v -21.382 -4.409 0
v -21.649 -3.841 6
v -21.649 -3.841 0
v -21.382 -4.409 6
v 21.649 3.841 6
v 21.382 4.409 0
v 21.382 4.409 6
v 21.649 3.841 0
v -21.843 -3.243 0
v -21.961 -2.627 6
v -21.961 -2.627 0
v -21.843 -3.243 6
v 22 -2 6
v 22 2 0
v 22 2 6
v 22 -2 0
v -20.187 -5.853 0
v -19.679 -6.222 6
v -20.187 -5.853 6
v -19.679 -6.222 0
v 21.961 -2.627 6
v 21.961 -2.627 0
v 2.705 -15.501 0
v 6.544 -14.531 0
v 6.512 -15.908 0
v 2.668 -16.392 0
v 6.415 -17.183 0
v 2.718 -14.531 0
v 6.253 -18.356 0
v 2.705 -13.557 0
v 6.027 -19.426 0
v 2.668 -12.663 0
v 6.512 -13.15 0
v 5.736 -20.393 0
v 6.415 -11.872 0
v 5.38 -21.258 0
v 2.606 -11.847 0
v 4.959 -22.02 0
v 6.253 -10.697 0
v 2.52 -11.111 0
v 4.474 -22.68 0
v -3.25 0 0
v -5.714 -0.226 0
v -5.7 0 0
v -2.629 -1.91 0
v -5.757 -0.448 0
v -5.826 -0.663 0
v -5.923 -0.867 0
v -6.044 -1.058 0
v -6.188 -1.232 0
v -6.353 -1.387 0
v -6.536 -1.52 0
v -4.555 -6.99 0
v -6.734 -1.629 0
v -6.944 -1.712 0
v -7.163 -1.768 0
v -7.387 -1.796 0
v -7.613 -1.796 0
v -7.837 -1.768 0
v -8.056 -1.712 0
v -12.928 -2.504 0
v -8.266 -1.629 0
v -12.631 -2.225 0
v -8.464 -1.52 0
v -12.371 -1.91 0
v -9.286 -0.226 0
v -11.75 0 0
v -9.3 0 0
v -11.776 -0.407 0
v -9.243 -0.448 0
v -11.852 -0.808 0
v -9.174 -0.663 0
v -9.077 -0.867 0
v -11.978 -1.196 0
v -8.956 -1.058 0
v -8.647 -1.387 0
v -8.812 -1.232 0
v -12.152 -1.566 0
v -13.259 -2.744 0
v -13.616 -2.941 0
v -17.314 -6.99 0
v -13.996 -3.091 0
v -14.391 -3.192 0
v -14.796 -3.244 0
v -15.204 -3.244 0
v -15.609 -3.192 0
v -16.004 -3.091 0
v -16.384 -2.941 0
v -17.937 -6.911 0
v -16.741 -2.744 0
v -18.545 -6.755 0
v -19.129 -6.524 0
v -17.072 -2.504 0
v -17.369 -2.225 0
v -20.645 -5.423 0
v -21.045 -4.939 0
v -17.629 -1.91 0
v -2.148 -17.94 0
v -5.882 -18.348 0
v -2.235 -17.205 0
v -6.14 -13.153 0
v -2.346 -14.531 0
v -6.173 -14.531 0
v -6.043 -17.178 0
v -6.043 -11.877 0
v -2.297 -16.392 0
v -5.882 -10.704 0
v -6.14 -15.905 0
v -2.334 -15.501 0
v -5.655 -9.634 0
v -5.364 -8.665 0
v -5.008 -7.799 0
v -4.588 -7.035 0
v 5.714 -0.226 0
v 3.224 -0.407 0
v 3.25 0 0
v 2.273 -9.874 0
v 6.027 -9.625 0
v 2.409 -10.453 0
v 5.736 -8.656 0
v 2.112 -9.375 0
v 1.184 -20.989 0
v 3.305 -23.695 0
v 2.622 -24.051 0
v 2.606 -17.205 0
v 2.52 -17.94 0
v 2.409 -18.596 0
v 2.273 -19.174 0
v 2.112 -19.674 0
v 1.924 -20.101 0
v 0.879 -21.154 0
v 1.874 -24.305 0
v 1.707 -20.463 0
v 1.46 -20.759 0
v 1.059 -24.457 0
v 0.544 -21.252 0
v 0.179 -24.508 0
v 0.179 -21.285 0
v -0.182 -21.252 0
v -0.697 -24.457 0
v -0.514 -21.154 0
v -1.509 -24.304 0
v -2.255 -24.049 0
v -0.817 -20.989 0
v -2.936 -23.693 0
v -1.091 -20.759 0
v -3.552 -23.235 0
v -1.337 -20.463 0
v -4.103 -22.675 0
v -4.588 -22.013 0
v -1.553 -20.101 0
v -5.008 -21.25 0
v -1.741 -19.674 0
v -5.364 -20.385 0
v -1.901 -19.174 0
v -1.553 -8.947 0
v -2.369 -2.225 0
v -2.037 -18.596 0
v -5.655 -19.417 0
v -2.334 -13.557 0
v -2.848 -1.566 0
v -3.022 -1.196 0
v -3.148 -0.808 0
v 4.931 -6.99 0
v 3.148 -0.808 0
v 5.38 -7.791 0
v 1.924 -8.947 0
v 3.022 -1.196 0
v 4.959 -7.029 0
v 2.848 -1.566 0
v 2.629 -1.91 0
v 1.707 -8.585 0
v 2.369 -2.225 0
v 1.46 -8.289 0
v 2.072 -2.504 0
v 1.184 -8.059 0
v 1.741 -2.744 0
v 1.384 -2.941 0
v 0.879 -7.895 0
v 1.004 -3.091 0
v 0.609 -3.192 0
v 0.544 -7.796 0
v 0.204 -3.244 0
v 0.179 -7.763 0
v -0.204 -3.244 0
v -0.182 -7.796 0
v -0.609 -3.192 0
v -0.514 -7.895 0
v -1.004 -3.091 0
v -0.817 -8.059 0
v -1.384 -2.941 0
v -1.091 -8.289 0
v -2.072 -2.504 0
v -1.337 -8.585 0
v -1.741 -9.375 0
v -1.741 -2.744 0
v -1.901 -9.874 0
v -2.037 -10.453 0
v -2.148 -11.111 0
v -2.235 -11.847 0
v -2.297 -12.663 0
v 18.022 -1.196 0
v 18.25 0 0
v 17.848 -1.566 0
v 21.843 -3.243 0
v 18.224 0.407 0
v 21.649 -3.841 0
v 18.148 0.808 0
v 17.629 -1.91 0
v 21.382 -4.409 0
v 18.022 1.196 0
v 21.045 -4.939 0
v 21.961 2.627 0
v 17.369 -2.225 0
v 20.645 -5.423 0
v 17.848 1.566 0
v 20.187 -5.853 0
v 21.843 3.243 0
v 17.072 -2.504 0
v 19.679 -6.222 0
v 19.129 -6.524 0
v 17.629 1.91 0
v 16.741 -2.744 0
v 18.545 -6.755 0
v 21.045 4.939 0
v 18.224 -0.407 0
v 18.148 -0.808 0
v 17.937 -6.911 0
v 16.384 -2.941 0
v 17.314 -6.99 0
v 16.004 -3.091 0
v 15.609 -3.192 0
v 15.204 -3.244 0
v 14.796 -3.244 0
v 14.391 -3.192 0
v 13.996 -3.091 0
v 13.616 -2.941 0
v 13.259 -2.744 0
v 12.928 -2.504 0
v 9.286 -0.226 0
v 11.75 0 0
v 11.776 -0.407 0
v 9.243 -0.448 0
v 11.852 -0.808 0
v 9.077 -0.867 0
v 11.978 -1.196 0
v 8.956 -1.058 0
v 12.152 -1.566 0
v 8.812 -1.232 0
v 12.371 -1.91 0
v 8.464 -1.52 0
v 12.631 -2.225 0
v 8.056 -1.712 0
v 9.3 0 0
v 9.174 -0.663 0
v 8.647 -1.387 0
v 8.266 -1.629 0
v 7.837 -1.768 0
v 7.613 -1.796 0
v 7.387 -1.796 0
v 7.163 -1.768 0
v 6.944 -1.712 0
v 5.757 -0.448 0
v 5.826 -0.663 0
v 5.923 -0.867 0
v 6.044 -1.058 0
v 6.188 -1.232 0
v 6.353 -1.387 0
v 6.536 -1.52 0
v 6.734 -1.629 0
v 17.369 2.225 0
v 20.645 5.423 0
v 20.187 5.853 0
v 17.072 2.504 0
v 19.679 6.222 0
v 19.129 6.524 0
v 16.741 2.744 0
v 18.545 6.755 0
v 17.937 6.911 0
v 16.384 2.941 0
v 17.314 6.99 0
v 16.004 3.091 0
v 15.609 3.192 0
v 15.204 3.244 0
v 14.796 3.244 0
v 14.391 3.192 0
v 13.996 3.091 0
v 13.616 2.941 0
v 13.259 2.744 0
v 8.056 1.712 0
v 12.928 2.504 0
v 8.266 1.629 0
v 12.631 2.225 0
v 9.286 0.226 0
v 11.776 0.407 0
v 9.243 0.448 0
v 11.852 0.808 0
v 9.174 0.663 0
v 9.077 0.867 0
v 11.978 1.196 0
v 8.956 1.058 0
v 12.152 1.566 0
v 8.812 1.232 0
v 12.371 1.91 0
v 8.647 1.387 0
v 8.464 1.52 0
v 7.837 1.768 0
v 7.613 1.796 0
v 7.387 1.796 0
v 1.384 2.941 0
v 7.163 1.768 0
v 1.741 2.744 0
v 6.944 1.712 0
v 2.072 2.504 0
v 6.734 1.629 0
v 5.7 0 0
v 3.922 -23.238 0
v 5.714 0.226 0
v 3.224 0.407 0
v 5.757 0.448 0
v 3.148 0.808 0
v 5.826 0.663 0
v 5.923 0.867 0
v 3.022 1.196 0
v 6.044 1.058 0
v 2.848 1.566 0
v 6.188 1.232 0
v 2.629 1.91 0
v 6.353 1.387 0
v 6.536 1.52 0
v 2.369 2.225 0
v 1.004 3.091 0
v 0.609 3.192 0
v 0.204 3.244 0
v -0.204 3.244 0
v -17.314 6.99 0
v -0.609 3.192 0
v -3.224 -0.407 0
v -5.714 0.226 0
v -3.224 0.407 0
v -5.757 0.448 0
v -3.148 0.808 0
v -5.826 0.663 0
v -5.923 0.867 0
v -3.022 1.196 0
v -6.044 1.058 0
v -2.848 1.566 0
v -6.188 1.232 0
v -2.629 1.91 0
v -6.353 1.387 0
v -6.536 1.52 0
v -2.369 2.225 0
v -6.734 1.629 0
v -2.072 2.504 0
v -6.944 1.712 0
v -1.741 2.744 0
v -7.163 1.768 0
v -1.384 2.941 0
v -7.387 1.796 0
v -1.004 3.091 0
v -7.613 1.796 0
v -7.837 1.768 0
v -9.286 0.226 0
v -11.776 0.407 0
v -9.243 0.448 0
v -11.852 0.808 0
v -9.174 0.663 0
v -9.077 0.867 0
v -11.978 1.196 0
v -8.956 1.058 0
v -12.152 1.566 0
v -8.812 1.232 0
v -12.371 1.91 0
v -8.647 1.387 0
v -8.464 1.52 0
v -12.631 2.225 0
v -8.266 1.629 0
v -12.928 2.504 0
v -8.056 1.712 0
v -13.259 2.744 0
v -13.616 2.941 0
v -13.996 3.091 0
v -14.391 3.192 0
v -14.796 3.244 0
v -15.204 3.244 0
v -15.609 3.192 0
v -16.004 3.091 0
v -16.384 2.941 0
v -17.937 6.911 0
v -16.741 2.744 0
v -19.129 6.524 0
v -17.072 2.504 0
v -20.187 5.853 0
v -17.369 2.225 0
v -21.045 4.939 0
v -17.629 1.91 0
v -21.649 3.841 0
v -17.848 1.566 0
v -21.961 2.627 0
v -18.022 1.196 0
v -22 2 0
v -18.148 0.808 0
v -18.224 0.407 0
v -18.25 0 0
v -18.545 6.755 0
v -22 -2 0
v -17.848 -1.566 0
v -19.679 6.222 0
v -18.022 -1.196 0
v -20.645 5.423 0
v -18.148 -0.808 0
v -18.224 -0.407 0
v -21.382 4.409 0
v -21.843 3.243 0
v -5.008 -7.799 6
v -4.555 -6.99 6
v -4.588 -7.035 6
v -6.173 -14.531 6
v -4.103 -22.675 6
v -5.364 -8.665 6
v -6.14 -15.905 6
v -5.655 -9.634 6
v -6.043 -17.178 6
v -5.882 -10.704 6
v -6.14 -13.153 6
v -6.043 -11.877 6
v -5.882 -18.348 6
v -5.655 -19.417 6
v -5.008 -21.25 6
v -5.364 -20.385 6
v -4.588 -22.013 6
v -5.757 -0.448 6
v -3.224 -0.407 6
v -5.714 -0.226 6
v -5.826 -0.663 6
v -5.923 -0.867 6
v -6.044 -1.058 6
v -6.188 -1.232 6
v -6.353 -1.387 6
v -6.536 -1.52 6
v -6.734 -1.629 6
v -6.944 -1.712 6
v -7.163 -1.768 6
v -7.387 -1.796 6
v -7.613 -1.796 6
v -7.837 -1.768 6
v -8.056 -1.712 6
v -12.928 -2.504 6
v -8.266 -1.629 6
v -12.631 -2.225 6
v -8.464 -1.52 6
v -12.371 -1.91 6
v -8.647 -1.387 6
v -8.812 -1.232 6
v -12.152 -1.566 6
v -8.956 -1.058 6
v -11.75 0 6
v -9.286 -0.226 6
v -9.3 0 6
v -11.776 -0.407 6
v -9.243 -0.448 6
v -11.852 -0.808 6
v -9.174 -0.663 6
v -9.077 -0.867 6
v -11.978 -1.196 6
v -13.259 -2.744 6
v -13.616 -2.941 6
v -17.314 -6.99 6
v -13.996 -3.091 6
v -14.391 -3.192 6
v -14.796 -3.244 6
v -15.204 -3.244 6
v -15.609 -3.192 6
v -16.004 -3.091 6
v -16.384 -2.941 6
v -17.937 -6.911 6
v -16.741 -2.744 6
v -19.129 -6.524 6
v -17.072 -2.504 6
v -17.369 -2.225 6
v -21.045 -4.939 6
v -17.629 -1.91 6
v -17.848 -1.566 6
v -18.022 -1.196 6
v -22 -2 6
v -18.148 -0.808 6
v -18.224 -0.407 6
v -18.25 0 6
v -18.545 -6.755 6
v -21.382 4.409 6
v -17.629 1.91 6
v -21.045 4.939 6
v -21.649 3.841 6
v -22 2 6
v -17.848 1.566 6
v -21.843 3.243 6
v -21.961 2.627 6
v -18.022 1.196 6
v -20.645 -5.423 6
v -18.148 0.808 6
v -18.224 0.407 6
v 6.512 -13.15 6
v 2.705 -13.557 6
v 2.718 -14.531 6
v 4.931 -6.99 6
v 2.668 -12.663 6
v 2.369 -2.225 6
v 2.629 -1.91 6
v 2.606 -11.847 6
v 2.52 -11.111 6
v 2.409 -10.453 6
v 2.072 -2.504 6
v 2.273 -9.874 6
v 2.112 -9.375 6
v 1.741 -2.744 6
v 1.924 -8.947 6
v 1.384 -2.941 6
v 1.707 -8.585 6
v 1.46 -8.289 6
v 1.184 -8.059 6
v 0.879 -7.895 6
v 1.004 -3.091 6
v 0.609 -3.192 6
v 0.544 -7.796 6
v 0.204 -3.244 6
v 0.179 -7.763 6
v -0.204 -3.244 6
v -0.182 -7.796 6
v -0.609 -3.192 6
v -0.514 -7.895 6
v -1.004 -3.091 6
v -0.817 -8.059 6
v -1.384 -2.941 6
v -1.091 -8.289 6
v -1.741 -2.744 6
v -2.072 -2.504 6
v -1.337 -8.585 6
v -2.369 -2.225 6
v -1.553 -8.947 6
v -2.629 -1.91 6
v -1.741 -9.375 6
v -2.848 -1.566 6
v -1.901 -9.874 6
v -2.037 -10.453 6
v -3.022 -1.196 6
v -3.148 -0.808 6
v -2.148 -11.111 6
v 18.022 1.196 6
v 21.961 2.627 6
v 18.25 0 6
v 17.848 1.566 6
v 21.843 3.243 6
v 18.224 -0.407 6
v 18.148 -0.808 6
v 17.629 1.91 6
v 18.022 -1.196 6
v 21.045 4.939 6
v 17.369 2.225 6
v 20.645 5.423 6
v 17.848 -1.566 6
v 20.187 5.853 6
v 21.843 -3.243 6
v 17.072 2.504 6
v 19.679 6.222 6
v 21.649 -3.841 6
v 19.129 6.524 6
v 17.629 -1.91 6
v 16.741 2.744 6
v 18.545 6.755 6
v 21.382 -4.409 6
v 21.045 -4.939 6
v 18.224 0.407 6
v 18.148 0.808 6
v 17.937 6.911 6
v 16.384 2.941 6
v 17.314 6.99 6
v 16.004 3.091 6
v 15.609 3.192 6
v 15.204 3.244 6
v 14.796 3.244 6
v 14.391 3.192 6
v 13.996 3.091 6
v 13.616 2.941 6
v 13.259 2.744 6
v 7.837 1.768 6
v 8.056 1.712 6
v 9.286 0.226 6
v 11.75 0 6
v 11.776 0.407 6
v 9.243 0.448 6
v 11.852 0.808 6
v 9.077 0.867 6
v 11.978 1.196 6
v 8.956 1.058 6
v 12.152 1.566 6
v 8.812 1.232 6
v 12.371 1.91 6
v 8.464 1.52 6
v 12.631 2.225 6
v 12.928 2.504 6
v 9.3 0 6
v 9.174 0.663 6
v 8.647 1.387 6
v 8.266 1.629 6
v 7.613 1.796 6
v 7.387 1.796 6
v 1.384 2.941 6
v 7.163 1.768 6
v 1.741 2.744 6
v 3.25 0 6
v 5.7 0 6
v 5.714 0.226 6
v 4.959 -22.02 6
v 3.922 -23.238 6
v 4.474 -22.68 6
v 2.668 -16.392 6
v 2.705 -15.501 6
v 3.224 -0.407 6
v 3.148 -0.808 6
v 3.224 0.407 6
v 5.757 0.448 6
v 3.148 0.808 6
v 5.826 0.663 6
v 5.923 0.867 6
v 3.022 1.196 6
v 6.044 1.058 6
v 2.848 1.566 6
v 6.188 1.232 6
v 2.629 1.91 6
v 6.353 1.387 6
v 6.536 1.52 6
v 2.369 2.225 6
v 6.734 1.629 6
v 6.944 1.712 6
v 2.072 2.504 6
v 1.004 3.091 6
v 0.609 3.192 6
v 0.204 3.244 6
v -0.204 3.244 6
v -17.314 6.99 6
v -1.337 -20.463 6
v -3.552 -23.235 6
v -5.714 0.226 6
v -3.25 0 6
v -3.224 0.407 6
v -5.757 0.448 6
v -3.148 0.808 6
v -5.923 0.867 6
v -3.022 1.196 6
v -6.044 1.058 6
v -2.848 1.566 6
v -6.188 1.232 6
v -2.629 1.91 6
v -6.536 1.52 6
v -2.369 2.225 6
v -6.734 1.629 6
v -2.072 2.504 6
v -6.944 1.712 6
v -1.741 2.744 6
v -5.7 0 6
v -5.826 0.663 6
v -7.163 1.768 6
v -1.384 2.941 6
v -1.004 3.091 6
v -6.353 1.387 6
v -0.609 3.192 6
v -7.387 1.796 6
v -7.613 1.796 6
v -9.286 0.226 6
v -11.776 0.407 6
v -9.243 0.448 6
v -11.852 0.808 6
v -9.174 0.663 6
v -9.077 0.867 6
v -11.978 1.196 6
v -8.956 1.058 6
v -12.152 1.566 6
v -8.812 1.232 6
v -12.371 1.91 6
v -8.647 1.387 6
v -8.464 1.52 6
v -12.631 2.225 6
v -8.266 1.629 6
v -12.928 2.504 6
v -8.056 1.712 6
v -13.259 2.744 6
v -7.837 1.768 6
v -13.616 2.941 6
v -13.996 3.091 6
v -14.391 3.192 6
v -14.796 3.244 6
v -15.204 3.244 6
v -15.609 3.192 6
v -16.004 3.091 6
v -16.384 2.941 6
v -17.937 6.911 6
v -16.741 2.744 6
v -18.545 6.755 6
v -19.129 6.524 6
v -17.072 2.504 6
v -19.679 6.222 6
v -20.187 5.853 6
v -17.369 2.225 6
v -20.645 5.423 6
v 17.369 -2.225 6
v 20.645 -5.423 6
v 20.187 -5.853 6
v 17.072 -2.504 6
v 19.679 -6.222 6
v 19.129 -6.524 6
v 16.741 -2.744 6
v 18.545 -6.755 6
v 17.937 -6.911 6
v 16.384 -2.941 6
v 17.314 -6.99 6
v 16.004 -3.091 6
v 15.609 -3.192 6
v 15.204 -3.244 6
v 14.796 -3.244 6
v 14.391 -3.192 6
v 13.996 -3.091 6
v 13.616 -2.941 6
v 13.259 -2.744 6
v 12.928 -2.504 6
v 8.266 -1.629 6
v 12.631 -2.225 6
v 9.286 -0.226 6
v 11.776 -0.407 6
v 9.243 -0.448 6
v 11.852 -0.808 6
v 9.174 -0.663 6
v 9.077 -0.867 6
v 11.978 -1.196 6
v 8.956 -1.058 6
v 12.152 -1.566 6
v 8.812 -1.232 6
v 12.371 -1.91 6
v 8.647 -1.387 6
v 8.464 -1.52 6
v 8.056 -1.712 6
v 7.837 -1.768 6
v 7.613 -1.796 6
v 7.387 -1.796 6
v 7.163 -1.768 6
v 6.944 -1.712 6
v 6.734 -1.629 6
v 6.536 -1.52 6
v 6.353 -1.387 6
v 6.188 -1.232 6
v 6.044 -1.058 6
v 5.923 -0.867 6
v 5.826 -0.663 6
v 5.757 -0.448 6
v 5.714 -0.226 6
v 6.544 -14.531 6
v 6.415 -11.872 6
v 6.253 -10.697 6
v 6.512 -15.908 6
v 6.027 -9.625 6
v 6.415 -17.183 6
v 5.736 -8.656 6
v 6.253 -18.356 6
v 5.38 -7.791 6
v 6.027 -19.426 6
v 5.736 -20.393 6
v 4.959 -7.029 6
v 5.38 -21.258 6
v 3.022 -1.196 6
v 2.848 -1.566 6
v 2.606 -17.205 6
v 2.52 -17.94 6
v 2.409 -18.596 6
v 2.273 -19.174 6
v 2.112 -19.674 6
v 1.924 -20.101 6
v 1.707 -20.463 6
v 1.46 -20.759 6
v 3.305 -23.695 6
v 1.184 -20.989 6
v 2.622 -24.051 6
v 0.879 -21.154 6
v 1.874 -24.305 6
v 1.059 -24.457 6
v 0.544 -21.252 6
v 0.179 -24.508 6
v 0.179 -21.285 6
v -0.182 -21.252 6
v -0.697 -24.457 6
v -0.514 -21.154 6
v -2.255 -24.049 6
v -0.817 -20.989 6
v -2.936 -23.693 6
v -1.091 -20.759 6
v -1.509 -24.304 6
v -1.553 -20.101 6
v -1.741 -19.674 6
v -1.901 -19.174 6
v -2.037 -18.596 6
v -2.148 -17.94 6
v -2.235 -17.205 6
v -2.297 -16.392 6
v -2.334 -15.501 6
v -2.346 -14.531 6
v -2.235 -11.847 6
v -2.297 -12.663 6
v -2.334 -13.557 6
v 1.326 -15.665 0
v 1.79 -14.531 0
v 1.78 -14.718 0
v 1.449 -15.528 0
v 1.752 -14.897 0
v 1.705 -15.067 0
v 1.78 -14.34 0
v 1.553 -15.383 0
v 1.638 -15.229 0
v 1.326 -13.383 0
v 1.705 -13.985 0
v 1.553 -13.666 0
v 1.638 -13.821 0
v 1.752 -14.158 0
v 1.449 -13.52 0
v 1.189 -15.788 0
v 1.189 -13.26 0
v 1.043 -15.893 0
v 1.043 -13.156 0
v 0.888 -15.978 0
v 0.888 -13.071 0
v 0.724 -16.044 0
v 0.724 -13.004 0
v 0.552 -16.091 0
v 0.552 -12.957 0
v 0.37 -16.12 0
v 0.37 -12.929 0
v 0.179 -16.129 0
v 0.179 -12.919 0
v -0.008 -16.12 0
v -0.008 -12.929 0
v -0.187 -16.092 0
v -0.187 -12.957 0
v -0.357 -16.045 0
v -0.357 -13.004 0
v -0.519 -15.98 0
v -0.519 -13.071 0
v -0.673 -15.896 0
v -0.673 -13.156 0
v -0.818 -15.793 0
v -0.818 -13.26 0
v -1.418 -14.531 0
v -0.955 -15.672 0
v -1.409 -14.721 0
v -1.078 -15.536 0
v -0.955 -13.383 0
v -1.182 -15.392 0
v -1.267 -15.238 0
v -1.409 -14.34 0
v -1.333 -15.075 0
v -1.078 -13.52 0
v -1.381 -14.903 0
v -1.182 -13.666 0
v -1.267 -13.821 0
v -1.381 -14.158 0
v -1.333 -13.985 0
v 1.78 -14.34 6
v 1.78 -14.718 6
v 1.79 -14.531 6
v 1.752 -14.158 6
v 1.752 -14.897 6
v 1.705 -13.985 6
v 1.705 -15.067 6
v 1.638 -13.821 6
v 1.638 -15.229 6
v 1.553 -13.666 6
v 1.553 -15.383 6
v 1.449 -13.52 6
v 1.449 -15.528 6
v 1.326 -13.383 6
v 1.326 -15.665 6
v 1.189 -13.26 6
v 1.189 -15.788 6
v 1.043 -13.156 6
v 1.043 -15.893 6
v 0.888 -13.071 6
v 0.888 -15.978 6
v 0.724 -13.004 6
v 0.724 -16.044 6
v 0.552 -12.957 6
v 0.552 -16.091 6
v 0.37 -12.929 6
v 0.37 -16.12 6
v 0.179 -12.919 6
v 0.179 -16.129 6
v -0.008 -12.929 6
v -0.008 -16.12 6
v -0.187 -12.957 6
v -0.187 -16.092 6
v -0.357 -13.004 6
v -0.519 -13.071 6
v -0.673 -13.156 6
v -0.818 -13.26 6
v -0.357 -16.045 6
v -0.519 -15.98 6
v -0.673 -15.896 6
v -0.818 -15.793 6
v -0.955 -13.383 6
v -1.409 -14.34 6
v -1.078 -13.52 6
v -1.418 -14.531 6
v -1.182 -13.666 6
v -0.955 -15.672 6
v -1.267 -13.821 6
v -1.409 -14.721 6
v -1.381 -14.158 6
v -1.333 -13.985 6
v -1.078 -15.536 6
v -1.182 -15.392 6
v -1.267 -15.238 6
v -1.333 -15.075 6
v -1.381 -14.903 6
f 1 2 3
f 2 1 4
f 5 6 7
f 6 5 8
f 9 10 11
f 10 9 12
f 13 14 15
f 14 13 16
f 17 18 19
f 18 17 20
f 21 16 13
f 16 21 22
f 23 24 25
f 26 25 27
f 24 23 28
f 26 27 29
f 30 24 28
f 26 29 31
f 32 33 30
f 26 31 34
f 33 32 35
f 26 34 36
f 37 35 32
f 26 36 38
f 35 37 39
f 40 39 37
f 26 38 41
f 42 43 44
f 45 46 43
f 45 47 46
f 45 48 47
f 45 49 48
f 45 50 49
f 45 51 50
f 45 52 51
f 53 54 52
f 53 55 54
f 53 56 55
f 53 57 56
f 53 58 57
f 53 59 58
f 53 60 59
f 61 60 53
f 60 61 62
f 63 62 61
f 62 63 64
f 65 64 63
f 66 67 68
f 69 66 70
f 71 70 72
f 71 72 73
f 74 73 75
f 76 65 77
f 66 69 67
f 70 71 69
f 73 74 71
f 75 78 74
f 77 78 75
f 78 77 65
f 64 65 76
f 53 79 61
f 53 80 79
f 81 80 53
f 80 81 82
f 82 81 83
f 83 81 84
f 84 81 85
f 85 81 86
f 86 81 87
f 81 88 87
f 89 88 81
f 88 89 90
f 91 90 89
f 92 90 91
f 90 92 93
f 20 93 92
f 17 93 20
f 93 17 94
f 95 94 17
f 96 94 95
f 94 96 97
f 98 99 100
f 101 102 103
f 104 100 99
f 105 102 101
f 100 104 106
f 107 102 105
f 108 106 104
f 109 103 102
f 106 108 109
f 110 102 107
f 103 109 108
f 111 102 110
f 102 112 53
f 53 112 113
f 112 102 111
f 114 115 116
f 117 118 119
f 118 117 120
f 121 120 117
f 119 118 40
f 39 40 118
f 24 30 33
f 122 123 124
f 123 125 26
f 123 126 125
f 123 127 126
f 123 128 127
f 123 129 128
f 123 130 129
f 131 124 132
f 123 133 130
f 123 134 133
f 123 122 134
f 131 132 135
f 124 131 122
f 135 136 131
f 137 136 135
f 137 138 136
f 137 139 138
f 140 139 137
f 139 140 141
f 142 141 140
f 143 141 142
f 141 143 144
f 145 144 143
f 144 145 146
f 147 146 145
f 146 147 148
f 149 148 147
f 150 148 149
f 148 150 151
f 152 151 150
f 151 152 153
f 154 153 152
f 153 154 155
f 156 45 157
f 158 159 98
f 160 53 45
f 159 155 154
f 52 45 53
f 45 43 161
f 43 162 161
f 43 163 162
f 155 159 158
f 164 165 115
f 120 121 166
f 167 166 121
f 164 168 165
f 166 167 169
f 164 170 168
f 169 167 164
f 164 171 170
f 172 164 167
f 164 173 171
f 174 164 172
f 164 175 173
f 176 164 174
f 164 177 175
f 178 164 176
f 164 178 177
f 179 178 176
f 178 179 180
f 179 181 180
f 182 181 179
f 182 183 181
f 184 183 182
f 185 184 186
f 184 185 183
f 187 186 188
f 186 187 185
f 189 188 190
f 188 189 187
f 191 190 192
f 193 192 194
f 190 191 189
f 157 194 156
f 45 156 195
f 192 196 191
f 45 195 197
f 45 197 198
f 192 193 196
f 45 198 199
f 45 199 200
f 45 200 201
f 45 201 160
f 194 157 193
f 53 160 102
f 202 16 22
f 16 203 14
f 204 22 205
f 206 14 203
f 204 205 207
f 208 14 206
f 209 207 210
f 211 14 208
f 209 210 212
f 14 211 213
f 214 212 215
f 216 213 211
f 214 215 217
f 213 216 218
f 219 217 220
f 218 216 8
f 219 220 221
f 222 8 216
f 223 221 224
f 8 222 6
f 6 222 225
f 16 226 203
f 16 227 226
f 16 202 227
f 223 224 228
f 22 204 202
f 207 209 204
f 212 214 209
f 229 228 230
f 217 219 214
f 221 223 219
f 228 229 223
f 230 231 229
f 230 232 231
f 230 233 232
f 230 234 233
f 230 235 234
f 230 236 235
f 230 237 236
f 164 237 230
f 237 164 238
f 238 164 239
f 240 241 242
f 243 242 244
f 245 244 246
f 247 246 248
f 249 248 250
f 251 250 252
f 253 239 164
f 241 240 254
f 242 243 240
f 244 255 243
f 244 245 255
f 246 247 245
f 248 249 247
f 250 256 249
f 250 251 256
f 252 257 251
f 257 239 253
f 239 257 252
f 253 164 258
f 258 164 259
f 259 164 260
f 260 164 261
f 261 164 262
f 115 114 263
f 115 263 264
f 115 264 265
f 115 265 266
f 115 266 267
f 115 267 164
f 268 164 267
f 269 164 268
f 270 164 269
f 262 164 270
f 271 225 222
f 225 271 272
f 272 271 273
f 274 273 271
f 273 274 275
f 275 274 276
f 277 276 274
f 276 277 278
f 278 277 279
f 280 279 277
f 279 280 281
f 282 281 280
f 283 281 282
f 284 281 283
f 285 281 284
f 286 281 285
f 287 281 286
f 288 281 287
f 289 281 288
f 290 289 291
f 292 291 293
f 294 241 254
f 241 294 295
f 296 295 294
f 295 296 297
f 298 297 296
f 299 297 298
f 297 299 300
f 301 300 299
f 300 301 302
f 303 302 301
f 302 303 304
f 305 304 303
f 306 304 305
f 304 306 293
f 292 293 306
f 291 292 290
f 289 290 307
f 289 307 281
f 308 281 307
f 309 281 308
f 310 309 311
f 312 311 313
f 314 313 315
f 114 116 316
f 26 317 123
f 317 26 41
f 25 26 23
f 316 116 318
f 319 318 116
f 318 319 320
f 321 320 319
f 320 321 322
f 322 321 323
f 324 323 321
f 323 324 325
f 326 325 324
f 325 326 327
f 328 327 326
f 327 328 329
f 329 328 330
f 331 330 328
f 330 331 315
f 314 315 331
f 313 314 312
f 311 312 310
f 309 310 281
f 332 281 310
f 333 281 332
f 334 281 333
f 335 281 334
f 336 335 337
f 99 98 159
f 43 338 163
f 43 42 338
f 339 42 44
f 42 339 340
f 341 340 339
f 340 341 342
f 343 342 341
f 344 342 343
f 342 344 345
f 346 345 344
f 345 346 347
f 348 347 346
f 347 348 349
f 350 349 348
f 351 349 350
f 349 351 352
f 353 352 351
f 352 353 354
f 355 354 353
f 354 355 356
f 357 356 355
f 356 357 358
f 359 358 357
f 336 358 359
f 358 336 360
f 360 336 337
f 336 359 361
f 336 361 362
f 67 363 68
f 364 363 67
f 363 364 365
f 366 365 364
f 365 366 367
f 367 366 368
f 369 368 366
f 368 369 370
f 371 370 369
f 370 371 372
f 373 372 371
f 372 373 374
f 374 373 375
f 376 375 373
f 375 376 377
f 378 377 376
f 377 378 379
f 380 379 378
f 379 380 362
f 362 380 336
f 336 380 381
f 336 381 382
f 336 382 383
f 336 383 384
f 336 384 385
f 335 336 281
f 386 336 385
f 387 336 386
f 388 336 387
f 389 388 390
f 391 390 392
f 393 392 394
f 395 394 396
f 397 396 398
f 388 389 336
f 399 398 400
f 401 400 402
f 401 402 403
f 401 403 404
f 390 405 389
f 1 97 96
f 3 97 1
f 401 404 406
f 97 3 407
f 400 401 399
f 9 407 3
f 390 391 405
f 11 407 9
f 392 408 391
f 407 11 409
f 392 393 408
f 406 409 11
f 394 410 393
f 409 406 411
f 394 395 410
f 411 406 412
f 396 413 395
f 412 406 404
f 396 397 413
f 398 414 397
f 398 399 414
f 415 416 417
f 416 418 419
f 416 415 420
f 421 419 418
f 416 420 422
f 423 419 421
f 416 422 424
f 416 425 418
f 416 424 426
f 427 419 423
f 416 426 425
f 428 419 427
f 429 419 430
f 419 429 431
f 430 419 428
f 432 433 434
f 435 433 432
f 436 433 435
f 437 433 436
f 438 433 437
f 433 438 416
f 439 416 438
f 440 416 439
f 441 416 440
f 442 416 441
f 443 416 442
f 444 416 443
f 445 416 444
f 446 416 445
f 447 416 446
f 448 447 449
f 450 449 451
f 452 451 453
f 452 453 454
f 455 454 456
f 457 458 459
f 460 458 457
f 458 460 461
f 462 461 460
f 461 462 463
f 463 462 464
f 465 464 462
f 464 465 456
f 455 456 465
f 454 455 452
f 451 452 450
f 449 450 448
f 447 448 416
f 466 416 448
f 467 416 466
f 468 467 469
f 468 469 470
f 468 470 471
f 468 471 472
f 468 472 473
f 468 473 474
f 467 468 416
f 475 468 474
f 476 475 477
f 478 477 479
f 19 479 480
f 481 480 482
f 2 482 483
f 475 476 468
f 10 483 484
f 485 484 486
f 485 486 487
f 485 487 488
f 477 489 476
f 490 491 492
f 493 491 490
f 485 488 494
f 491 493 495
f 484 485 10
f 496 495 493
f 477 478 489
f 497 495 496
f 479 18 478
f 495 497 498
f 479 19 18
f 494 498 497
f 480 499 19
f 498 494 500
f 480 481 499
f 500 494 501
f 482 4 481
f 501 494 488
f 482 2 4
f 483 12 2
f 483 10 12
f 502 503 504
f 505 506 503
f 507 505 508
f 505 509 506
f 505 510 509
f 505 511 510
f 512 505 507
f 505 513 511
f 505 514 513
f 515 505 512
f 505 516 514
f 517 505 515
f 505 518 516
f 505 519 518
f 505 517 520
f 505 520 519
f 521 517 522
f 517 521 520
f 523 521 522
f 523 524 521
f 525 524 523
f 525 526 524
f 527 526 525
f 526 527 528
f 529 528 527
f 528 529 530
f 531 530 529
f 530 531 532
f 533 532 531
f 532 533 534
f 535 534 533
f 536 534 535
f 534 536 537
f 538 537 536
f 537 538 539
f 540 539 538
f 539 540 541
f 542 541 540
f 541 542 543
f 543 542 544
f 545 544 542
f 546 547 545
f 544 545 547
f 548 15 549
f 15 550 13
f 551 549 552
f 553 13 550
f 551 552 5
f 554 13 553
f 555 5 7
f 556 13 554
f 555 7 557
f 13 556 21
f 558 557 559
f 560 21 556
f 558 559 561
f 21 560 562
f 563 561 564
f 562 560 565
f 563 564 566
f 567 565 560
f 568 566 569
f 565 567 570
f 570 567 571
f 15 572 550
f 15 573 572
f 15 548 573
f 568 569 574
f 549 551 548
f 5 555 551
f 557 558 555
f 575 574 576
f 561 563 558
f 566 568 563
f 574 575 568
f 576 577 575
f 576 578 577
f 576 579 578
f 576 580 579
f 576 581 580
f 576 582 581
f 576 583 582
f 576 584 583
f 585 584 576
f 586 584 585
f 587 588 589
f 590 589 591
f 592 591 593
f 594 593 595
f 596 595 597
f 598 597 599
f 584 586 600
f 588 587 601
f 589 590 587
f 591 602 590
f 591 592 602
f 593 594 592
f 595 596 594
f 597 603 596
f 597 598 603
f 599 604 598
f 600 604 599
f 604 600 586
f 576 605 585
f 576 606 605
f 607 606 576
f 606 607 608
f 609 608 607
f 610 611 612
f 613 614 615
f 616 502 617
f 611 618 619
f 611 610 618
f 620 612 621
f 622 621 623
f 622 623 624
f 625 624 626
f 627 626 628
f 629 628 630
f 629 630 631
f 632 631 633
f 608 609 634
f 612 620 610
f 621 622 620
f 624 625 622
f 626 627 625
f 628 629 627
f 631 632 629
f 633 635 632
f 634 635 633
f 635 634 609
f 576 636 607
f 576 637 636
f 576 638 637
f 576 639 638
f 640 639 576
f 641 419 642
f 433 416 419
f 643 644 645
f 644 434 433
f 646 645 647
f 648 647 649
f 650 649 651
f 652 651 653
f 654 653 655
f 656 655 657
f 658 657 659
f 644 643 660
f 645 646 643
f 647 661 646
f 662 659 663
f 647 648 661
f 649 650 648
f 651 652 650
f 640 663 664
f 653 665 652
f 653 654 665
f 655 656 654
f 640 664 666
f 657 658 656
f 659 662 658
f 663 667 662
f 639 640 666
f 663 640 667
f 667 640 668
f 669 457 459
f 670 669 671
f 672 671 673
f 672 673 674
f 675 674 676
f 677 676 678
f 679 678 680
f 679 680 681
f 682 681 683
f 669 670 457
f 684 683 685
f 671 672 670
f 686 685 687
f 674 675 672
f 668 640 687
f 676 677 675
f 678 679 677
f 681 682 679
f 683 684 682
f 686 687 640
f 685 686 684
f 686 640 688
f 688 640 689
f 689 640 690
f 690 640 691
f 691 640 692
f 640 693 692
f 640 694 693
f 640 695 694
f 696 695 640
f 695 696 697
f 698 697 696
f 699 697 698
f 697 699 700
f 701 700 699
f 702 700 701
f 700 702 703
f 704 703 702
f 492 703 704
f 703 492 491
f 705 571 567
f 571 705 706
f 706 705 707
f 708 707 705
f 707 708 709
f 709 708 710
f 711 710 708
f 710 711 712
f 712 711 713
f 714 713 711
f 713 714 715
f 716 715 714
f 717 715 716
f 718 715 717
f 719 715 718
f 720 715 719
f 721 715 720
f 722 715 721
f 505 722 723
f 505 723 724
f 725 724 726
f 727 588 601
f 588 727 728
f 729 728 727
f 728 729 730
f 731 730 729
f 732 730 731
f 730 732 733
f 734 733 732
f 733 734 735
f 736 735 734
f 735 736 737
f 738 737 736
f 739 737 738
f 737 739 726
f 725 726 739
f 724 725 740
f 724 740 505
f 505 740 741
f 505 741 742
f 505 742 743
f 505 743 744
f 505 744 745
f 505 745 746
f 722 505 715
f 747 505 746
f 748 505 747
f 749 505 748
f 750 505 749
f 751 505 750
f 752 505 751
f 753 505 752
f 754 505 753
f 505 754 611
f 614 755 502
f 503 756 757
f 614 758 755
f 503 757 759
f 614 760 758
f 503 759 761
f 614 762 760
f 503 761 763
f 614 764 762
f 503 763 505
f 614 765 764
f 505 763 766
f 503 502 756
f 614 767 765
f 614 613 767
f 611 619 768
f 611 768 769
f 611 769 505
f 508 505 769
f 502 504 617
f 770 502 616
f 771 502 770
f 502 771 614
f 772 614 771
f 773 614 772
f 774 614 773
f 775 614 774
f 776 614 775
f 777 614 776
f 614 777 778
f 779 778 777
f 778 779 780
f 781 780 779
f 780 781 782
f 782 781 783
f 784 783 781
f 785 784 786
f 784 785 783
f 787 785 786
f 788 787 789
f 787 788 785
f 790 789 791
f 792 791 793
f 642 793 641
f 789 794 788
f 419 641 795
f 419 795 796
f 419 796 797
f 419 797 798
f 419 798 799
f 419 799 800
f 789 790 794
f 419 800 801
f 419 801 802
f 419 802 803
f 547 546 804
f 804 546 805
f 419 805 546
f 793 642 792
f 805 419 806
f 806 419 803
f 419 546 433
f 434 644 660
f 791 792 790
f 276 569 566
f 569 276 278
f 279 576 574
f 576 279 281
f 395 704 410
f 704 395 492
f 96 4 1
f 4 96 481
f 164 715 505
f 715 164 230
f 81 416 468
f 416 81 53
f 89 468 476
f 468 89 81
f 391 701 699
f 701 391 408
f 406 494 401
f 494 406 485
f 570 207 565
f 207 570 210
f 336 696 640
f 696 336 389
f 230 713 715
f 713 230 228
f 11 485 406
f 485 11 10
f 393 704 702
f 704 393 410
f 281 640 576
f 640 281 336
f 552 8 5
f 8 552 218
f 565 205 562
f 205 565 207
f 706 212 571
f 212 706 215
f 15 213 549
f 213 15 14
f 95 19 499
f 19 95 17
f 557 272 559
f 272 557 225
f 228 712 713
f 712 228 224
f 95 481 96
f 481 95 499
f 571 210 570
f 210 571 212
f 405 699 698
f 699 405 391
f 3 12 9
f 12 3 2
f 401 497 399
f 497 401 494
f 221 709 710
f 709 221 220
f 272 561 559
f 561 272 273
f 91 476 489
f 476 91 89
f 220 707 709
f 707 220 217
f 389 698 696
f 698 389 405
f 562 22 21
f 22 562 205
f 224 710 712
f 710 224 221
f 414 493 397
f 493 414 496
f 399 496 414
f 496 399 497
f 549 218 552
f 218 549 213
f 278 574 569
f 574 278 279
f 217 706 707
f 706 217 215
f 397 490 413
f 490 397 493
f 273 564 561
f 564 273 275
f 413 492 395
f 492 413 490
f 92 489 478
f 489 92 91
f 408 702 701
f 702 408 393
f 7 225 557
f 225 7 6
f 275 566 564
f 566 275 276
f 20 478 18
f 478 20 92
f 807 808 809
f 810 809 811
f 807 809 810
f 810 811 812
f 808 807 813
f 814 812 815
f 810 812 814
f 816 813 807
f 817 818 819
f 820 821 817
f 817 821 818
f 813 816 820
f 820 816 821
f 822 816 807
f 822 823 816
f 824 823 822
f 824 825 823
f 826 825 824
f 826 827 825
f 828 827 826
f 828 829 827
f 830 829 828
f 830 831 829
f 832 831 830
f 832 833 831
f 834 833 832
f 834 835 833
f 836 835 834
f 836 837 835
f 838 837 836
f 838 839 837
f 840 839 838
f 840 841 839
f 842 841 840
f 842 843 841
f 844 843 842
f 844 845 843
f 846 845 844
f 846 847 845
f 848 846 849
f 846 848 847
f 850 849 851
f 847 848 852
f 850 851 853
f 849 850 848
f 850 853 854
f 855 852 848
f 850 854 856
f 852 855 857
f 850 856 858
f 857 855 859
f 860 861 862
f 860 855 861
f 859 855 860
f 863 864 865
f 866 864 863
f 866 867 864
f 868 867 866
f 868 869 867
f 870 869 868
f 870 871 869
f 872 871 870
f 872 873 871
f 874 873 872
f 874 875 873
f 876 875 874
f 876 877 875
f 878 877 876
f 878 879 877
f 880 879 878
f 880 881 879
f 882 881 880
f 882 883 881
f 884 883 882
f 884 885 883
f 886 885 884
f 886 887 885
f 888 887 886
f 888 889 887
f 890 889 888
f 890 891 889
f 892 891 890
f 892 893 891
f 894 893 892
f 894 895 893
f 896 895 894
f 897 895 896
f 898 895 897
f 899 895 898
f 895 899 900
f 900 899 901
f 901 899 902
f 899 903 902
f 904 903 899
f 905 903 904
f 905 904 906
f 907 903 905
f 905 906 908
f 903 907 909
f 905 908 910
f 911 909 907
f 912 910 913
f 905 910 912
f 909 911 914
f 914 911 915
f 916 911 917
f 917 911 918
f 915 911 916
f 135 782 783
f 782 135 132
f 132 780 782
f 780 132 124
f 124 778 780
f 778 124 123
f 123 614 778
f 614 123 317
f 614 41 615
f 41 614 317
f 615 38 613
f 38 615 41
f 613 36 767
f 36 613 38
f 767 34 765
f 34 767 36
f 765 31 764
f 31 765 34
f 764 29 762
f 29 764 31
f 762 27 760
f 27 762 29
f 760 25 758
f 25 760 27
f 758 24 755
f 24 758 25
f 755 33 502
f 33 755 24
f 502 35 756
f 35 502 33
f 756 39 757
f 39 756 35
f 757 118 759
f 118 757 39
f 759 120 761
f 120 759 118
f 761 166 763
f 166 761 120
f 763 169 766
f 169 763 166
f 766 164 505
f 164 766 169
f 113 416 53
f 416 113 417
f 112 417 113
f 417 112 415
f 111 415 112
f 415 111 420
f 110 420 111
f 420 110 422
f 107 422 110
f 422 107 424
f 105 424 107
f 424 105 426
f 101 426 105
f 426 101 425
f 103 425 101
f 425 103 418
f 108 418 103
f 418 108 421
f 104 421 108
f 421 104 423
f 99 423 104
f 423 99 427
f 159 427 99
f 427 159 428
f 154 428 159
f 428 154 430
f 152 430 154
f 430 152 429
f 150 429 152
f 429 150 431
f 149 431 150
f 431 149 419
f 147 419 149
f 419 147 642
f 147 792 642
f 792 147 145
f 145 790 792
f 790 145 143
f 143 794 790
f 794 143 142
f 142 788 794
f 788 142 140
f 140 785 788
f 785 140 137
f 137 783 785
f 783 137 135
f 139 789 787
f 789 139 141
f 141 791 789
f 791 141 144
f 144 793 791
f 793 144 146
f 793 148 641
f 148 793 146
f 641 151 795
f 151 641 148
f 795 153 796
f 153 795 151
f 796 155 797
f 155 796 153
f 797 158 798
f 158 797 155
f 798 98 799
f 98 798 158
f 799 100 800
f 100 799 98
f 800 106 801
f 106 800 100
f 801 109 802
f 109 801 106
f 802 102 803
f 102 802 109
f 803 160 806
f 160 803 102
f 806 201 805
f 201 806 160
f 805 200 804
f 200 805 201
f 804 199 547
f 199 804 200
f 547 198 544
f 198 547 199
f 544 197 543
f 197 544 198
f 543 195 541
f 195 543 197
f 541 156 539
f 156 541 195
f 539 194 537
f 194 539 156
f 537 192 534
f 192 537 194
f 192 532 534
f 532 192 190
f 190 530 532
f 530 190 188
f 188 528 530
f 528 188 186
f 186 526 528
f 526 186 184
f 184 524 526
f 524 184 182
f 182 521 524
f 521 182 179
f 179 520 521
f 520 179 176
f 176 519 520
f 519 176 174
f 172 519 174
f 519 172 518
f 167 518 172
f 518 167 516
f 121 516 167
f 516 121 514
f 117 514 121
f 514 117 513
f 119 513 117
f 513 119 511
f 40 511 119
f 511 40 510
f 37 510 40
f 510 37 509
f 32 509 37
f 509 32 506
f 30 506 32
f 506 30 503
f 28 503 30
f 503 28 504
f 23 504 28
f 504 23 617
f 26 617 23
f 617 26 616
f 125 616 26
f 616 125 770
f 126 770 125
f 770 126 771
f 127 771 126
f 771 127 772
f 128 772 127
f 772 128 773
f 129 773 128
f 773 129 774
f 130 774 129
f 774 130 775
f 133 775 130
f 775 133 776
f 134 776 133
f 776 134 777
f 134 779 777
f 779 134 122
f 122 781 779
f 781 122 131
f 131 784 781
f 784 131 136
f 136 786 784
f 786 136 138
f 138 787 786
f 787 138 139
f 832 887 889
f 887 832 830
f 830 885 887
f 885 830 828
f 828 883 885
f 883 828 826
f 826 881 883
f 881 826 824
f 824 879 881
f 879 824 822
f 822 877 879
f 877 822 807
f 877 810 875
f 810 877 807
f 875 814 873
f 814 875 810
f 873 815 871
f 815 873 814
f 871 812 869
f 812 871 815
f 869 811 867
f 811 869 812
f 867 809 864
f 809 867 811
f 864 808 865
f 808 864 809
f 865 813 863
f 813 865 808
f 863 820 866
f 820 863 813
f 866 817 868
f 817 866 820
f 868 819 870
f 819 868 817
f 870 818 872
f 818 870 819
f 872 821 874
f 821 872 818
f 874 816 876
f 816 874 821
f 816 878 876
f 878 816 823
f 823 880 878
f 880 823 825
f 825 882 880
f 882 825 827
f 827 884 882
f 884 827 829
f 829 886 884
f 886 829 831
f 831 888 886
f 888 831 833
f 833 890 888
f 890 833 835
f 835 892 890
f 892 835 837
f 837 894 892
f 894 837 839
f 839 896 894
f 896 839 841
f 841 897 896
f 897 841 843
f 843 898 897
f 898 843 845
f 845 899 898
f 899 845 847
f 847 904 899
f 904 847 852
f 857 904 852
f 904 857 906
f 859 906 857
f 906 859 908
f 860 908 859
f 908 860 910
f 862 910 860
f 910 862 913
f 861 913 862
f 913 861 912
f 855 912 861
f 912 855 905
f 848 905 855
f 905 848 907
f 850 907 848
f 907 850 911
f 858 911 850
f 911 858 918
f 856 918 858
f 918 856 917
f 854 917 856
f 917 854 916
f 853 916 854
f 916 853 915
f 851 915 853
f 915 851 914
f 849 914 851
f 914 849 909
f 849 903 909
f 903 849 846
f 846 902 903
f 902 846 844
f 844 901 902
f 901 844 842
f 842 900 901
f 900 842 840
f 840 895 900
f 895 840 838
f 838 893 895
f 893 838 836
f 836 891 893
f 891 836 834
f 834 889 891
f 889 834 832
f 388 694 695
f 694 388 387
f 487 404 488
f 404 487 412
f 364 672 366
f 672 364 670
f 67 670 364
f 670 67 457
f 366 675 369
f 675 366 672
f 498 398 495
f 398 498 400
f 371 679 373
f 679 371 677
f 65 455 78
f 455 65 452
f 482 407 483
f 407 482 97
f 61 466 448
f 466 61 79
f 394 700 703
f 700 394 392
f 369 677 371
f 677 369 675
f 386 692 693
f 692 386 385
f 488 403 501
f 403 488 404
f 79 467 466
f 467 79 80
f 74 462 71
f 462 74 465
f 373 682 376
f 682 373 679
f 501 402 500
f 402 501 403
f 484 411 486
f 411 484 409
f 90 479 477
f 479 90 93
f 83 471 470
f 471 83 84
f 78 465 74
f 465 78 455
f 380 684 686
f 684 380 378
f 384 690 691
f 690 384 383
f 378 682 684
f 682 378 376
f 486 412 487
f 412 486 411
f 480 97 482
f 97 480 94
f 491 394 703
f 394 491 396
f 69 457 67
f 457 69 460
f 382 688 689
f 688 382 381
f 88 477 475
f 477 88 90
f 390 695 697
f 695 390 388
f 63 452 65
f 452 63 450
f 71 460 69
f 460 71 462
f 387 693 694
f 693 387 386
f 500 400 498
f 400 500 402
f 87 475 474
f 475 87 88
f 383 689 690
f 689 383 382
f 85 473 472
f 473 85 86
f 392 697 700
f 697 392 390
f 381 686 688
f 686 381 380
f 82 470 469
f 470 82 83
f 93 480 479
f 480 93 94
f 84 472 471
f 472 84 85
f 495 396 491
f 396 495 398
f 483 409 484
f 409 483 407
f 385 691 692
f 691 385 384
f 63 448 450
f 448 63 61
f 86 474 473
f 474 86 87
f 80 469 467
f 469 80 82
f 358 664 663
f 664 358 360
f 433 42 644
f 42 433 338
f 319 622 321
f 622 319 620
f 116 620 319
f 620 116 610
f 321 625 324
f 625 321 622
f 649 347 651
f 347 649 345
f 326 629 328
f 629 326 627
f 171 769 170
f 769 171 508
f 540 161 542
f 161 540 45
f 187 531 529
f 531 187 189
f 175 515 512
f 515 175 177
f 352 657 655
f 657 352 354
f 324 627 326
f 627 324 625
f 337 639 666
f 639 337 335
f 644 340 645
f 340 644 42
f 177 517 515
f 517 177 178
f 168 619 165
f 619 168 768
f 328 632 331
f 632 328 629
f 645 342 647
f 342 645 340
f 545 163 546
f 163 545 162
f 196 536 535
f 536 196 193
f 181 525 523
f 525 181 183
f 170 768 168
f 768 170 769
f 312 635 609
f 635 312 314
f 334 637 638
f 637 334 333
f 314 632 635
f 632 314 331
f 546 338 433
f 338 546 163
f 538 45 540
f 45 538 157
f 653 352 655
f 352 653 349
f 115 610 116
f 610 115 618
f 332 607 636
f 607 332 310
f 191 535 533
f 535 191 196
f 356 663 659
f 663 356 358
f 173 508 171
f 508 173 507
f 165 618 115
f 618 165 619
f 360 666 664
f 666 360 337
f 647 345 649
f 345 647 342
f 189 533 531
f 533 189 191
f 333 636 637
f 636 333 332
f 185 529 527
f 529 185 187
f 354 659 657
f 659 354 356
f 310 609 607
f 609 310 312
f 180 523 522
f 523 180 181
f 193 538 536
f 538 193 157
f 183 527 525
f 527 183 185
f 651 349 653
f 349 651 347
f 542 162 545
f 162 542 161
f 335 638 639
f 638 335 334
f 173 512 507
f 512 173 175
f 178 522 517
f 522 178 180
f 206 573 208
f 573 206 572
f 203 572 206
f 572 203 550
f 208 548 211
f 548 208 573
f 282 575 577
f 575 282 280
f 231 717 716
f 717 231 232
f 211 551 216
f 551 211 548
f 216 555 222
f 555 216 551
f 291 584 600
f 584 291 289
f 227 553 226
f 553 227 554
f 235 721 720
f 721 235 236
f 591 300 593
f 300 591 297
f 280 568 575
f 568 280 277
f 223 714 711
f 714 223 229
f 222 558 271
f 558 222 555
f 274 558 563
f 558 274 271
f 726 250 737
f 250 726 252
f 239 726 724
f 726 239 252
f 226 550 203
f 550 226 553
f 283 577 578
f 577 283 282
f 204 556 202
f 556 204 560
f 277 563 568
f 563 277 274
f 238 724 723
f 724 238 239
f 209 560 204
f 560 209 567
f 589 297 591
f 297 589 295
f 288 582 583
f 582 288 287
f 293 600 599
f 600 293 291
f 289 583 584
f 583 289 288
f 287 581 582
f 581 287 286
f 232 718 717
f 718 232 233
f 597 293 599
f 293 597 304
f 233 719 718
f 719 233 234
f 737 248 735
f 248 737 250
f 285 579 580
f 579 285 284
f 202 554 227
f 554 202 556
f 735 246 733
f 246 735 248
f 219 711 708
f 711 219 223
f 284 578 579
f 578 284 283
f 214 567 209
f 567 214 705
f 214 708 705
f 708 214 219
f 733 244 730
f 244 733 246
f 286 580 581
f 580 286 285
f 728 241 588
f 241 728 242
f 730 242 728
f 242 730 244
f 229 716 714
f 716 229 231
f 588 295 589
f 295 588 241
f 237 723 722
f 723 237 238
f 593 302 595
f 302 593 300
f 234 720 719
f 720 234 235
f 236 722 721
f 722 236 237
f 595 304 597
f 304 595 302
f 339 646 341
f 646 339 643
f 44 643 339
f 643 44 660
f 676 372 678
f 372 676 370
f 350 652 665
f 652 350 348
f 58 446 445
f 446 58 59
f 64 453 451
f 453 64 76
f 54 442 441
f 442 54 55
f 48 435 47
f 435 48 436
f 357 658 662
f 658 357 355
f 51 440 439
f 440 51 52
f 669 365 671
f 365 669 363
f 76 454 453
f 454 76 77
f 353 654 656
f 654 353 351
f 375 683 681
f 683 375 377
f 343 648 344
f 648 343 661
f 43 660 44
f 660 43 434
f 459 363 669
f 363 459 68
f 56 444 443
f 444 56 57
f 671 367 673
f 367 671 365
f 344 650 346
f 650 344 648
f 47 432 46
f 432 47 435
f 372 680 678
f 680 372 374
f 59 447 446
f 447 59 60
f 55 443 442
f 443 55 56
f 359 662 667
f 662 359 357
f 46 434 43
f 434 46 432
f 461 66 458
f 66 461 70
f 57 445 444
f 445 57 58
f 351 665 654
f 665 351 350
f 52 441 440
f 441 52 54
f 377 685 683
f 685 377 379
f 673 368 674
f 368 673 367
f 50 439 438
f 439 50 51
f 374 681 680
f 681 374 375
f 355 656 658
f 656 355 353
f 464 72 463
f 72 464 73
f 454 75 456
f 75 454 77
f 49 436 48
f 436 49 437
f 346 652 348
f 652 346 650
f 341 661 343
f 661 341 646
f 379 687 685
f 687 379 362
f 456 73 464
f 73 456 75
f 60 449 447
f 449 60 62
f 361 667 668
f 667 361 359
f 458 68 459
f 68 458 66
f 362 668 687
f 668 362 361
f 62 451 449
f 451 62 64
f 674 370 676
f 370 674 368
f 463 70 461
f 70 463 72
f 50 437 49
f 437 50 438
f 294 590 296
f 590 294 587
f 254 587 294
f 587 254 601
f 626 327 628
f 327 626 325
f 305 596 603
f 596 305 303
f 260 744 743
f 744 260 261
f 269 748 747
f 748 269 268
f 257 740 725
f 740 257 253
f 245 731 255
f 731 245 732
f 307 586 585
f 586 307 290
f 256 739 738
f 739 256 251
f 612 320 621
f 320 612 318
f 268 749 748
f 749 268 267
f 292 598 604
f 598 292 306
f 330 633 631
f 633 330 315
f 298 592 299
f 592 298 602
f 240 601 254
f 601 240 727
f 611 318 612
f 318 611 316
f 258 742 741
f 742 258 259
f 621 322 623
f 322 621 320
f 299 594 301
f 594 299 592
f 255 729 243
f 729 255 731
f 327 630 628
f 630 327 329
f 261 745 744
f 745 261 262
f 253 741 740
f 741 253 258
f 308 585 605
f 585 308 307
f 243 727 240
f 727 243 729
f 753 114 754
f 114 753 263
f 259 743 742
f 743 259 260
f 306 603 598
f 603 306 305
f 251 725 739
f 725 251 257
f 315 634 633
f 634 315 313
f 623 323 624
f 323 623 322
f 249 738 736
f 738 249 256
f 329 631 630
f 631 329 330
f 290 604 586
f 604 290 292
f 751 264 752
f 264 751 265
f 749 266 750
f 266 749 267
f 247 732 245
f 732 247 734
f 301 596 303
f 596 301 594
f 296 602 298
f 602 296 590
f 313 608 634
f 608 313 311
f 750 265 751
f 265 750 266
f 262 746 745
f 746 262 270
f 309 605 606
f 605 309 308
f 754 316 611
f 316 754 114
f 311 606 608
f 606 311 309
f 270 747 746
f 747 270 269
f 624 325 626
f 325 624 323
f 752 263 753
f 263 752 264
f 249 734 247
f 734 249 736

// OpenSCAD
$fn = 50;


difference() {
	union() {
		hull() {
			translate(v = [-17.0000000000, 2.0000000000, 0]) {
				cylinder(h = 6, r = 5);
			}
			translate(v = [17.0000000000, 2.0000000000, 0]) {
				cylinder(h = 6, r = 5);
			}
			translate(v = [-17.0000000000, -2.0000000000, 0]) {
				cylinder(h = 6, r = 5);
			}
			translate(v = [17.0000000000, -2.0000000000, 0]) {
				cylinder(h = 6, r = 5);
			}
		}
		translate(v = [0, -5, 0]) {
			linear_extrude(height = 6) {
				text(font = "DejaVu Sans Mono:style=Bold", halign = "center", size = 19.0000000000, text = "0", valign = "top");
			}
		}
	}
	union() {
		translate(v = [-15.0000000000, 0.0000000000, 0]) {
			translate(v = [0, 0, -100]) {
				cylinder(h = 200, r = 3.2500000000);
			}
		}
		translate(v = [0, 0, -100]) {
			cylinder(h = 200, r = 3.2500000000);
		}
		translate(v = [15.0000000000, 0.0000000000, 0]) {
			translate(v = [0, 0, -100]) {
				cylinder(h = 200, r = 3.2500000000);
			}
		}
		translate(v = [-15.0000000000, 0.0000000000, 0]) {
			translate(v = [0, 0, -100]) {
				cylinder(h = 200, r = 1.8000000000);
			}
		}
		translate(v = [-7.5000000000, 0.0000000000, 0]) {
			translate(v = [0, 0, -100]) {
				cylinder(h = 200, r = 1.8000000000);
			}
		}
		translate(v = [0, 0, -100]) {
			cylinder(h = 200, r = 1.8000000000);
		}
		translate(v = [7.5000000000, 0.0000000000, 0]) {
			translate(v = [0, 0, -100]) {
				cylinder(h = 200, r = 1.8000000000);
			}
		}
		translate(v = [15.0000000000, 0.0000000000, 0]) {
			translate(v = [0, 0, -100]) {
				cylinder(h = 200, r = 1.8000000000);
			}
		}
	}
}
